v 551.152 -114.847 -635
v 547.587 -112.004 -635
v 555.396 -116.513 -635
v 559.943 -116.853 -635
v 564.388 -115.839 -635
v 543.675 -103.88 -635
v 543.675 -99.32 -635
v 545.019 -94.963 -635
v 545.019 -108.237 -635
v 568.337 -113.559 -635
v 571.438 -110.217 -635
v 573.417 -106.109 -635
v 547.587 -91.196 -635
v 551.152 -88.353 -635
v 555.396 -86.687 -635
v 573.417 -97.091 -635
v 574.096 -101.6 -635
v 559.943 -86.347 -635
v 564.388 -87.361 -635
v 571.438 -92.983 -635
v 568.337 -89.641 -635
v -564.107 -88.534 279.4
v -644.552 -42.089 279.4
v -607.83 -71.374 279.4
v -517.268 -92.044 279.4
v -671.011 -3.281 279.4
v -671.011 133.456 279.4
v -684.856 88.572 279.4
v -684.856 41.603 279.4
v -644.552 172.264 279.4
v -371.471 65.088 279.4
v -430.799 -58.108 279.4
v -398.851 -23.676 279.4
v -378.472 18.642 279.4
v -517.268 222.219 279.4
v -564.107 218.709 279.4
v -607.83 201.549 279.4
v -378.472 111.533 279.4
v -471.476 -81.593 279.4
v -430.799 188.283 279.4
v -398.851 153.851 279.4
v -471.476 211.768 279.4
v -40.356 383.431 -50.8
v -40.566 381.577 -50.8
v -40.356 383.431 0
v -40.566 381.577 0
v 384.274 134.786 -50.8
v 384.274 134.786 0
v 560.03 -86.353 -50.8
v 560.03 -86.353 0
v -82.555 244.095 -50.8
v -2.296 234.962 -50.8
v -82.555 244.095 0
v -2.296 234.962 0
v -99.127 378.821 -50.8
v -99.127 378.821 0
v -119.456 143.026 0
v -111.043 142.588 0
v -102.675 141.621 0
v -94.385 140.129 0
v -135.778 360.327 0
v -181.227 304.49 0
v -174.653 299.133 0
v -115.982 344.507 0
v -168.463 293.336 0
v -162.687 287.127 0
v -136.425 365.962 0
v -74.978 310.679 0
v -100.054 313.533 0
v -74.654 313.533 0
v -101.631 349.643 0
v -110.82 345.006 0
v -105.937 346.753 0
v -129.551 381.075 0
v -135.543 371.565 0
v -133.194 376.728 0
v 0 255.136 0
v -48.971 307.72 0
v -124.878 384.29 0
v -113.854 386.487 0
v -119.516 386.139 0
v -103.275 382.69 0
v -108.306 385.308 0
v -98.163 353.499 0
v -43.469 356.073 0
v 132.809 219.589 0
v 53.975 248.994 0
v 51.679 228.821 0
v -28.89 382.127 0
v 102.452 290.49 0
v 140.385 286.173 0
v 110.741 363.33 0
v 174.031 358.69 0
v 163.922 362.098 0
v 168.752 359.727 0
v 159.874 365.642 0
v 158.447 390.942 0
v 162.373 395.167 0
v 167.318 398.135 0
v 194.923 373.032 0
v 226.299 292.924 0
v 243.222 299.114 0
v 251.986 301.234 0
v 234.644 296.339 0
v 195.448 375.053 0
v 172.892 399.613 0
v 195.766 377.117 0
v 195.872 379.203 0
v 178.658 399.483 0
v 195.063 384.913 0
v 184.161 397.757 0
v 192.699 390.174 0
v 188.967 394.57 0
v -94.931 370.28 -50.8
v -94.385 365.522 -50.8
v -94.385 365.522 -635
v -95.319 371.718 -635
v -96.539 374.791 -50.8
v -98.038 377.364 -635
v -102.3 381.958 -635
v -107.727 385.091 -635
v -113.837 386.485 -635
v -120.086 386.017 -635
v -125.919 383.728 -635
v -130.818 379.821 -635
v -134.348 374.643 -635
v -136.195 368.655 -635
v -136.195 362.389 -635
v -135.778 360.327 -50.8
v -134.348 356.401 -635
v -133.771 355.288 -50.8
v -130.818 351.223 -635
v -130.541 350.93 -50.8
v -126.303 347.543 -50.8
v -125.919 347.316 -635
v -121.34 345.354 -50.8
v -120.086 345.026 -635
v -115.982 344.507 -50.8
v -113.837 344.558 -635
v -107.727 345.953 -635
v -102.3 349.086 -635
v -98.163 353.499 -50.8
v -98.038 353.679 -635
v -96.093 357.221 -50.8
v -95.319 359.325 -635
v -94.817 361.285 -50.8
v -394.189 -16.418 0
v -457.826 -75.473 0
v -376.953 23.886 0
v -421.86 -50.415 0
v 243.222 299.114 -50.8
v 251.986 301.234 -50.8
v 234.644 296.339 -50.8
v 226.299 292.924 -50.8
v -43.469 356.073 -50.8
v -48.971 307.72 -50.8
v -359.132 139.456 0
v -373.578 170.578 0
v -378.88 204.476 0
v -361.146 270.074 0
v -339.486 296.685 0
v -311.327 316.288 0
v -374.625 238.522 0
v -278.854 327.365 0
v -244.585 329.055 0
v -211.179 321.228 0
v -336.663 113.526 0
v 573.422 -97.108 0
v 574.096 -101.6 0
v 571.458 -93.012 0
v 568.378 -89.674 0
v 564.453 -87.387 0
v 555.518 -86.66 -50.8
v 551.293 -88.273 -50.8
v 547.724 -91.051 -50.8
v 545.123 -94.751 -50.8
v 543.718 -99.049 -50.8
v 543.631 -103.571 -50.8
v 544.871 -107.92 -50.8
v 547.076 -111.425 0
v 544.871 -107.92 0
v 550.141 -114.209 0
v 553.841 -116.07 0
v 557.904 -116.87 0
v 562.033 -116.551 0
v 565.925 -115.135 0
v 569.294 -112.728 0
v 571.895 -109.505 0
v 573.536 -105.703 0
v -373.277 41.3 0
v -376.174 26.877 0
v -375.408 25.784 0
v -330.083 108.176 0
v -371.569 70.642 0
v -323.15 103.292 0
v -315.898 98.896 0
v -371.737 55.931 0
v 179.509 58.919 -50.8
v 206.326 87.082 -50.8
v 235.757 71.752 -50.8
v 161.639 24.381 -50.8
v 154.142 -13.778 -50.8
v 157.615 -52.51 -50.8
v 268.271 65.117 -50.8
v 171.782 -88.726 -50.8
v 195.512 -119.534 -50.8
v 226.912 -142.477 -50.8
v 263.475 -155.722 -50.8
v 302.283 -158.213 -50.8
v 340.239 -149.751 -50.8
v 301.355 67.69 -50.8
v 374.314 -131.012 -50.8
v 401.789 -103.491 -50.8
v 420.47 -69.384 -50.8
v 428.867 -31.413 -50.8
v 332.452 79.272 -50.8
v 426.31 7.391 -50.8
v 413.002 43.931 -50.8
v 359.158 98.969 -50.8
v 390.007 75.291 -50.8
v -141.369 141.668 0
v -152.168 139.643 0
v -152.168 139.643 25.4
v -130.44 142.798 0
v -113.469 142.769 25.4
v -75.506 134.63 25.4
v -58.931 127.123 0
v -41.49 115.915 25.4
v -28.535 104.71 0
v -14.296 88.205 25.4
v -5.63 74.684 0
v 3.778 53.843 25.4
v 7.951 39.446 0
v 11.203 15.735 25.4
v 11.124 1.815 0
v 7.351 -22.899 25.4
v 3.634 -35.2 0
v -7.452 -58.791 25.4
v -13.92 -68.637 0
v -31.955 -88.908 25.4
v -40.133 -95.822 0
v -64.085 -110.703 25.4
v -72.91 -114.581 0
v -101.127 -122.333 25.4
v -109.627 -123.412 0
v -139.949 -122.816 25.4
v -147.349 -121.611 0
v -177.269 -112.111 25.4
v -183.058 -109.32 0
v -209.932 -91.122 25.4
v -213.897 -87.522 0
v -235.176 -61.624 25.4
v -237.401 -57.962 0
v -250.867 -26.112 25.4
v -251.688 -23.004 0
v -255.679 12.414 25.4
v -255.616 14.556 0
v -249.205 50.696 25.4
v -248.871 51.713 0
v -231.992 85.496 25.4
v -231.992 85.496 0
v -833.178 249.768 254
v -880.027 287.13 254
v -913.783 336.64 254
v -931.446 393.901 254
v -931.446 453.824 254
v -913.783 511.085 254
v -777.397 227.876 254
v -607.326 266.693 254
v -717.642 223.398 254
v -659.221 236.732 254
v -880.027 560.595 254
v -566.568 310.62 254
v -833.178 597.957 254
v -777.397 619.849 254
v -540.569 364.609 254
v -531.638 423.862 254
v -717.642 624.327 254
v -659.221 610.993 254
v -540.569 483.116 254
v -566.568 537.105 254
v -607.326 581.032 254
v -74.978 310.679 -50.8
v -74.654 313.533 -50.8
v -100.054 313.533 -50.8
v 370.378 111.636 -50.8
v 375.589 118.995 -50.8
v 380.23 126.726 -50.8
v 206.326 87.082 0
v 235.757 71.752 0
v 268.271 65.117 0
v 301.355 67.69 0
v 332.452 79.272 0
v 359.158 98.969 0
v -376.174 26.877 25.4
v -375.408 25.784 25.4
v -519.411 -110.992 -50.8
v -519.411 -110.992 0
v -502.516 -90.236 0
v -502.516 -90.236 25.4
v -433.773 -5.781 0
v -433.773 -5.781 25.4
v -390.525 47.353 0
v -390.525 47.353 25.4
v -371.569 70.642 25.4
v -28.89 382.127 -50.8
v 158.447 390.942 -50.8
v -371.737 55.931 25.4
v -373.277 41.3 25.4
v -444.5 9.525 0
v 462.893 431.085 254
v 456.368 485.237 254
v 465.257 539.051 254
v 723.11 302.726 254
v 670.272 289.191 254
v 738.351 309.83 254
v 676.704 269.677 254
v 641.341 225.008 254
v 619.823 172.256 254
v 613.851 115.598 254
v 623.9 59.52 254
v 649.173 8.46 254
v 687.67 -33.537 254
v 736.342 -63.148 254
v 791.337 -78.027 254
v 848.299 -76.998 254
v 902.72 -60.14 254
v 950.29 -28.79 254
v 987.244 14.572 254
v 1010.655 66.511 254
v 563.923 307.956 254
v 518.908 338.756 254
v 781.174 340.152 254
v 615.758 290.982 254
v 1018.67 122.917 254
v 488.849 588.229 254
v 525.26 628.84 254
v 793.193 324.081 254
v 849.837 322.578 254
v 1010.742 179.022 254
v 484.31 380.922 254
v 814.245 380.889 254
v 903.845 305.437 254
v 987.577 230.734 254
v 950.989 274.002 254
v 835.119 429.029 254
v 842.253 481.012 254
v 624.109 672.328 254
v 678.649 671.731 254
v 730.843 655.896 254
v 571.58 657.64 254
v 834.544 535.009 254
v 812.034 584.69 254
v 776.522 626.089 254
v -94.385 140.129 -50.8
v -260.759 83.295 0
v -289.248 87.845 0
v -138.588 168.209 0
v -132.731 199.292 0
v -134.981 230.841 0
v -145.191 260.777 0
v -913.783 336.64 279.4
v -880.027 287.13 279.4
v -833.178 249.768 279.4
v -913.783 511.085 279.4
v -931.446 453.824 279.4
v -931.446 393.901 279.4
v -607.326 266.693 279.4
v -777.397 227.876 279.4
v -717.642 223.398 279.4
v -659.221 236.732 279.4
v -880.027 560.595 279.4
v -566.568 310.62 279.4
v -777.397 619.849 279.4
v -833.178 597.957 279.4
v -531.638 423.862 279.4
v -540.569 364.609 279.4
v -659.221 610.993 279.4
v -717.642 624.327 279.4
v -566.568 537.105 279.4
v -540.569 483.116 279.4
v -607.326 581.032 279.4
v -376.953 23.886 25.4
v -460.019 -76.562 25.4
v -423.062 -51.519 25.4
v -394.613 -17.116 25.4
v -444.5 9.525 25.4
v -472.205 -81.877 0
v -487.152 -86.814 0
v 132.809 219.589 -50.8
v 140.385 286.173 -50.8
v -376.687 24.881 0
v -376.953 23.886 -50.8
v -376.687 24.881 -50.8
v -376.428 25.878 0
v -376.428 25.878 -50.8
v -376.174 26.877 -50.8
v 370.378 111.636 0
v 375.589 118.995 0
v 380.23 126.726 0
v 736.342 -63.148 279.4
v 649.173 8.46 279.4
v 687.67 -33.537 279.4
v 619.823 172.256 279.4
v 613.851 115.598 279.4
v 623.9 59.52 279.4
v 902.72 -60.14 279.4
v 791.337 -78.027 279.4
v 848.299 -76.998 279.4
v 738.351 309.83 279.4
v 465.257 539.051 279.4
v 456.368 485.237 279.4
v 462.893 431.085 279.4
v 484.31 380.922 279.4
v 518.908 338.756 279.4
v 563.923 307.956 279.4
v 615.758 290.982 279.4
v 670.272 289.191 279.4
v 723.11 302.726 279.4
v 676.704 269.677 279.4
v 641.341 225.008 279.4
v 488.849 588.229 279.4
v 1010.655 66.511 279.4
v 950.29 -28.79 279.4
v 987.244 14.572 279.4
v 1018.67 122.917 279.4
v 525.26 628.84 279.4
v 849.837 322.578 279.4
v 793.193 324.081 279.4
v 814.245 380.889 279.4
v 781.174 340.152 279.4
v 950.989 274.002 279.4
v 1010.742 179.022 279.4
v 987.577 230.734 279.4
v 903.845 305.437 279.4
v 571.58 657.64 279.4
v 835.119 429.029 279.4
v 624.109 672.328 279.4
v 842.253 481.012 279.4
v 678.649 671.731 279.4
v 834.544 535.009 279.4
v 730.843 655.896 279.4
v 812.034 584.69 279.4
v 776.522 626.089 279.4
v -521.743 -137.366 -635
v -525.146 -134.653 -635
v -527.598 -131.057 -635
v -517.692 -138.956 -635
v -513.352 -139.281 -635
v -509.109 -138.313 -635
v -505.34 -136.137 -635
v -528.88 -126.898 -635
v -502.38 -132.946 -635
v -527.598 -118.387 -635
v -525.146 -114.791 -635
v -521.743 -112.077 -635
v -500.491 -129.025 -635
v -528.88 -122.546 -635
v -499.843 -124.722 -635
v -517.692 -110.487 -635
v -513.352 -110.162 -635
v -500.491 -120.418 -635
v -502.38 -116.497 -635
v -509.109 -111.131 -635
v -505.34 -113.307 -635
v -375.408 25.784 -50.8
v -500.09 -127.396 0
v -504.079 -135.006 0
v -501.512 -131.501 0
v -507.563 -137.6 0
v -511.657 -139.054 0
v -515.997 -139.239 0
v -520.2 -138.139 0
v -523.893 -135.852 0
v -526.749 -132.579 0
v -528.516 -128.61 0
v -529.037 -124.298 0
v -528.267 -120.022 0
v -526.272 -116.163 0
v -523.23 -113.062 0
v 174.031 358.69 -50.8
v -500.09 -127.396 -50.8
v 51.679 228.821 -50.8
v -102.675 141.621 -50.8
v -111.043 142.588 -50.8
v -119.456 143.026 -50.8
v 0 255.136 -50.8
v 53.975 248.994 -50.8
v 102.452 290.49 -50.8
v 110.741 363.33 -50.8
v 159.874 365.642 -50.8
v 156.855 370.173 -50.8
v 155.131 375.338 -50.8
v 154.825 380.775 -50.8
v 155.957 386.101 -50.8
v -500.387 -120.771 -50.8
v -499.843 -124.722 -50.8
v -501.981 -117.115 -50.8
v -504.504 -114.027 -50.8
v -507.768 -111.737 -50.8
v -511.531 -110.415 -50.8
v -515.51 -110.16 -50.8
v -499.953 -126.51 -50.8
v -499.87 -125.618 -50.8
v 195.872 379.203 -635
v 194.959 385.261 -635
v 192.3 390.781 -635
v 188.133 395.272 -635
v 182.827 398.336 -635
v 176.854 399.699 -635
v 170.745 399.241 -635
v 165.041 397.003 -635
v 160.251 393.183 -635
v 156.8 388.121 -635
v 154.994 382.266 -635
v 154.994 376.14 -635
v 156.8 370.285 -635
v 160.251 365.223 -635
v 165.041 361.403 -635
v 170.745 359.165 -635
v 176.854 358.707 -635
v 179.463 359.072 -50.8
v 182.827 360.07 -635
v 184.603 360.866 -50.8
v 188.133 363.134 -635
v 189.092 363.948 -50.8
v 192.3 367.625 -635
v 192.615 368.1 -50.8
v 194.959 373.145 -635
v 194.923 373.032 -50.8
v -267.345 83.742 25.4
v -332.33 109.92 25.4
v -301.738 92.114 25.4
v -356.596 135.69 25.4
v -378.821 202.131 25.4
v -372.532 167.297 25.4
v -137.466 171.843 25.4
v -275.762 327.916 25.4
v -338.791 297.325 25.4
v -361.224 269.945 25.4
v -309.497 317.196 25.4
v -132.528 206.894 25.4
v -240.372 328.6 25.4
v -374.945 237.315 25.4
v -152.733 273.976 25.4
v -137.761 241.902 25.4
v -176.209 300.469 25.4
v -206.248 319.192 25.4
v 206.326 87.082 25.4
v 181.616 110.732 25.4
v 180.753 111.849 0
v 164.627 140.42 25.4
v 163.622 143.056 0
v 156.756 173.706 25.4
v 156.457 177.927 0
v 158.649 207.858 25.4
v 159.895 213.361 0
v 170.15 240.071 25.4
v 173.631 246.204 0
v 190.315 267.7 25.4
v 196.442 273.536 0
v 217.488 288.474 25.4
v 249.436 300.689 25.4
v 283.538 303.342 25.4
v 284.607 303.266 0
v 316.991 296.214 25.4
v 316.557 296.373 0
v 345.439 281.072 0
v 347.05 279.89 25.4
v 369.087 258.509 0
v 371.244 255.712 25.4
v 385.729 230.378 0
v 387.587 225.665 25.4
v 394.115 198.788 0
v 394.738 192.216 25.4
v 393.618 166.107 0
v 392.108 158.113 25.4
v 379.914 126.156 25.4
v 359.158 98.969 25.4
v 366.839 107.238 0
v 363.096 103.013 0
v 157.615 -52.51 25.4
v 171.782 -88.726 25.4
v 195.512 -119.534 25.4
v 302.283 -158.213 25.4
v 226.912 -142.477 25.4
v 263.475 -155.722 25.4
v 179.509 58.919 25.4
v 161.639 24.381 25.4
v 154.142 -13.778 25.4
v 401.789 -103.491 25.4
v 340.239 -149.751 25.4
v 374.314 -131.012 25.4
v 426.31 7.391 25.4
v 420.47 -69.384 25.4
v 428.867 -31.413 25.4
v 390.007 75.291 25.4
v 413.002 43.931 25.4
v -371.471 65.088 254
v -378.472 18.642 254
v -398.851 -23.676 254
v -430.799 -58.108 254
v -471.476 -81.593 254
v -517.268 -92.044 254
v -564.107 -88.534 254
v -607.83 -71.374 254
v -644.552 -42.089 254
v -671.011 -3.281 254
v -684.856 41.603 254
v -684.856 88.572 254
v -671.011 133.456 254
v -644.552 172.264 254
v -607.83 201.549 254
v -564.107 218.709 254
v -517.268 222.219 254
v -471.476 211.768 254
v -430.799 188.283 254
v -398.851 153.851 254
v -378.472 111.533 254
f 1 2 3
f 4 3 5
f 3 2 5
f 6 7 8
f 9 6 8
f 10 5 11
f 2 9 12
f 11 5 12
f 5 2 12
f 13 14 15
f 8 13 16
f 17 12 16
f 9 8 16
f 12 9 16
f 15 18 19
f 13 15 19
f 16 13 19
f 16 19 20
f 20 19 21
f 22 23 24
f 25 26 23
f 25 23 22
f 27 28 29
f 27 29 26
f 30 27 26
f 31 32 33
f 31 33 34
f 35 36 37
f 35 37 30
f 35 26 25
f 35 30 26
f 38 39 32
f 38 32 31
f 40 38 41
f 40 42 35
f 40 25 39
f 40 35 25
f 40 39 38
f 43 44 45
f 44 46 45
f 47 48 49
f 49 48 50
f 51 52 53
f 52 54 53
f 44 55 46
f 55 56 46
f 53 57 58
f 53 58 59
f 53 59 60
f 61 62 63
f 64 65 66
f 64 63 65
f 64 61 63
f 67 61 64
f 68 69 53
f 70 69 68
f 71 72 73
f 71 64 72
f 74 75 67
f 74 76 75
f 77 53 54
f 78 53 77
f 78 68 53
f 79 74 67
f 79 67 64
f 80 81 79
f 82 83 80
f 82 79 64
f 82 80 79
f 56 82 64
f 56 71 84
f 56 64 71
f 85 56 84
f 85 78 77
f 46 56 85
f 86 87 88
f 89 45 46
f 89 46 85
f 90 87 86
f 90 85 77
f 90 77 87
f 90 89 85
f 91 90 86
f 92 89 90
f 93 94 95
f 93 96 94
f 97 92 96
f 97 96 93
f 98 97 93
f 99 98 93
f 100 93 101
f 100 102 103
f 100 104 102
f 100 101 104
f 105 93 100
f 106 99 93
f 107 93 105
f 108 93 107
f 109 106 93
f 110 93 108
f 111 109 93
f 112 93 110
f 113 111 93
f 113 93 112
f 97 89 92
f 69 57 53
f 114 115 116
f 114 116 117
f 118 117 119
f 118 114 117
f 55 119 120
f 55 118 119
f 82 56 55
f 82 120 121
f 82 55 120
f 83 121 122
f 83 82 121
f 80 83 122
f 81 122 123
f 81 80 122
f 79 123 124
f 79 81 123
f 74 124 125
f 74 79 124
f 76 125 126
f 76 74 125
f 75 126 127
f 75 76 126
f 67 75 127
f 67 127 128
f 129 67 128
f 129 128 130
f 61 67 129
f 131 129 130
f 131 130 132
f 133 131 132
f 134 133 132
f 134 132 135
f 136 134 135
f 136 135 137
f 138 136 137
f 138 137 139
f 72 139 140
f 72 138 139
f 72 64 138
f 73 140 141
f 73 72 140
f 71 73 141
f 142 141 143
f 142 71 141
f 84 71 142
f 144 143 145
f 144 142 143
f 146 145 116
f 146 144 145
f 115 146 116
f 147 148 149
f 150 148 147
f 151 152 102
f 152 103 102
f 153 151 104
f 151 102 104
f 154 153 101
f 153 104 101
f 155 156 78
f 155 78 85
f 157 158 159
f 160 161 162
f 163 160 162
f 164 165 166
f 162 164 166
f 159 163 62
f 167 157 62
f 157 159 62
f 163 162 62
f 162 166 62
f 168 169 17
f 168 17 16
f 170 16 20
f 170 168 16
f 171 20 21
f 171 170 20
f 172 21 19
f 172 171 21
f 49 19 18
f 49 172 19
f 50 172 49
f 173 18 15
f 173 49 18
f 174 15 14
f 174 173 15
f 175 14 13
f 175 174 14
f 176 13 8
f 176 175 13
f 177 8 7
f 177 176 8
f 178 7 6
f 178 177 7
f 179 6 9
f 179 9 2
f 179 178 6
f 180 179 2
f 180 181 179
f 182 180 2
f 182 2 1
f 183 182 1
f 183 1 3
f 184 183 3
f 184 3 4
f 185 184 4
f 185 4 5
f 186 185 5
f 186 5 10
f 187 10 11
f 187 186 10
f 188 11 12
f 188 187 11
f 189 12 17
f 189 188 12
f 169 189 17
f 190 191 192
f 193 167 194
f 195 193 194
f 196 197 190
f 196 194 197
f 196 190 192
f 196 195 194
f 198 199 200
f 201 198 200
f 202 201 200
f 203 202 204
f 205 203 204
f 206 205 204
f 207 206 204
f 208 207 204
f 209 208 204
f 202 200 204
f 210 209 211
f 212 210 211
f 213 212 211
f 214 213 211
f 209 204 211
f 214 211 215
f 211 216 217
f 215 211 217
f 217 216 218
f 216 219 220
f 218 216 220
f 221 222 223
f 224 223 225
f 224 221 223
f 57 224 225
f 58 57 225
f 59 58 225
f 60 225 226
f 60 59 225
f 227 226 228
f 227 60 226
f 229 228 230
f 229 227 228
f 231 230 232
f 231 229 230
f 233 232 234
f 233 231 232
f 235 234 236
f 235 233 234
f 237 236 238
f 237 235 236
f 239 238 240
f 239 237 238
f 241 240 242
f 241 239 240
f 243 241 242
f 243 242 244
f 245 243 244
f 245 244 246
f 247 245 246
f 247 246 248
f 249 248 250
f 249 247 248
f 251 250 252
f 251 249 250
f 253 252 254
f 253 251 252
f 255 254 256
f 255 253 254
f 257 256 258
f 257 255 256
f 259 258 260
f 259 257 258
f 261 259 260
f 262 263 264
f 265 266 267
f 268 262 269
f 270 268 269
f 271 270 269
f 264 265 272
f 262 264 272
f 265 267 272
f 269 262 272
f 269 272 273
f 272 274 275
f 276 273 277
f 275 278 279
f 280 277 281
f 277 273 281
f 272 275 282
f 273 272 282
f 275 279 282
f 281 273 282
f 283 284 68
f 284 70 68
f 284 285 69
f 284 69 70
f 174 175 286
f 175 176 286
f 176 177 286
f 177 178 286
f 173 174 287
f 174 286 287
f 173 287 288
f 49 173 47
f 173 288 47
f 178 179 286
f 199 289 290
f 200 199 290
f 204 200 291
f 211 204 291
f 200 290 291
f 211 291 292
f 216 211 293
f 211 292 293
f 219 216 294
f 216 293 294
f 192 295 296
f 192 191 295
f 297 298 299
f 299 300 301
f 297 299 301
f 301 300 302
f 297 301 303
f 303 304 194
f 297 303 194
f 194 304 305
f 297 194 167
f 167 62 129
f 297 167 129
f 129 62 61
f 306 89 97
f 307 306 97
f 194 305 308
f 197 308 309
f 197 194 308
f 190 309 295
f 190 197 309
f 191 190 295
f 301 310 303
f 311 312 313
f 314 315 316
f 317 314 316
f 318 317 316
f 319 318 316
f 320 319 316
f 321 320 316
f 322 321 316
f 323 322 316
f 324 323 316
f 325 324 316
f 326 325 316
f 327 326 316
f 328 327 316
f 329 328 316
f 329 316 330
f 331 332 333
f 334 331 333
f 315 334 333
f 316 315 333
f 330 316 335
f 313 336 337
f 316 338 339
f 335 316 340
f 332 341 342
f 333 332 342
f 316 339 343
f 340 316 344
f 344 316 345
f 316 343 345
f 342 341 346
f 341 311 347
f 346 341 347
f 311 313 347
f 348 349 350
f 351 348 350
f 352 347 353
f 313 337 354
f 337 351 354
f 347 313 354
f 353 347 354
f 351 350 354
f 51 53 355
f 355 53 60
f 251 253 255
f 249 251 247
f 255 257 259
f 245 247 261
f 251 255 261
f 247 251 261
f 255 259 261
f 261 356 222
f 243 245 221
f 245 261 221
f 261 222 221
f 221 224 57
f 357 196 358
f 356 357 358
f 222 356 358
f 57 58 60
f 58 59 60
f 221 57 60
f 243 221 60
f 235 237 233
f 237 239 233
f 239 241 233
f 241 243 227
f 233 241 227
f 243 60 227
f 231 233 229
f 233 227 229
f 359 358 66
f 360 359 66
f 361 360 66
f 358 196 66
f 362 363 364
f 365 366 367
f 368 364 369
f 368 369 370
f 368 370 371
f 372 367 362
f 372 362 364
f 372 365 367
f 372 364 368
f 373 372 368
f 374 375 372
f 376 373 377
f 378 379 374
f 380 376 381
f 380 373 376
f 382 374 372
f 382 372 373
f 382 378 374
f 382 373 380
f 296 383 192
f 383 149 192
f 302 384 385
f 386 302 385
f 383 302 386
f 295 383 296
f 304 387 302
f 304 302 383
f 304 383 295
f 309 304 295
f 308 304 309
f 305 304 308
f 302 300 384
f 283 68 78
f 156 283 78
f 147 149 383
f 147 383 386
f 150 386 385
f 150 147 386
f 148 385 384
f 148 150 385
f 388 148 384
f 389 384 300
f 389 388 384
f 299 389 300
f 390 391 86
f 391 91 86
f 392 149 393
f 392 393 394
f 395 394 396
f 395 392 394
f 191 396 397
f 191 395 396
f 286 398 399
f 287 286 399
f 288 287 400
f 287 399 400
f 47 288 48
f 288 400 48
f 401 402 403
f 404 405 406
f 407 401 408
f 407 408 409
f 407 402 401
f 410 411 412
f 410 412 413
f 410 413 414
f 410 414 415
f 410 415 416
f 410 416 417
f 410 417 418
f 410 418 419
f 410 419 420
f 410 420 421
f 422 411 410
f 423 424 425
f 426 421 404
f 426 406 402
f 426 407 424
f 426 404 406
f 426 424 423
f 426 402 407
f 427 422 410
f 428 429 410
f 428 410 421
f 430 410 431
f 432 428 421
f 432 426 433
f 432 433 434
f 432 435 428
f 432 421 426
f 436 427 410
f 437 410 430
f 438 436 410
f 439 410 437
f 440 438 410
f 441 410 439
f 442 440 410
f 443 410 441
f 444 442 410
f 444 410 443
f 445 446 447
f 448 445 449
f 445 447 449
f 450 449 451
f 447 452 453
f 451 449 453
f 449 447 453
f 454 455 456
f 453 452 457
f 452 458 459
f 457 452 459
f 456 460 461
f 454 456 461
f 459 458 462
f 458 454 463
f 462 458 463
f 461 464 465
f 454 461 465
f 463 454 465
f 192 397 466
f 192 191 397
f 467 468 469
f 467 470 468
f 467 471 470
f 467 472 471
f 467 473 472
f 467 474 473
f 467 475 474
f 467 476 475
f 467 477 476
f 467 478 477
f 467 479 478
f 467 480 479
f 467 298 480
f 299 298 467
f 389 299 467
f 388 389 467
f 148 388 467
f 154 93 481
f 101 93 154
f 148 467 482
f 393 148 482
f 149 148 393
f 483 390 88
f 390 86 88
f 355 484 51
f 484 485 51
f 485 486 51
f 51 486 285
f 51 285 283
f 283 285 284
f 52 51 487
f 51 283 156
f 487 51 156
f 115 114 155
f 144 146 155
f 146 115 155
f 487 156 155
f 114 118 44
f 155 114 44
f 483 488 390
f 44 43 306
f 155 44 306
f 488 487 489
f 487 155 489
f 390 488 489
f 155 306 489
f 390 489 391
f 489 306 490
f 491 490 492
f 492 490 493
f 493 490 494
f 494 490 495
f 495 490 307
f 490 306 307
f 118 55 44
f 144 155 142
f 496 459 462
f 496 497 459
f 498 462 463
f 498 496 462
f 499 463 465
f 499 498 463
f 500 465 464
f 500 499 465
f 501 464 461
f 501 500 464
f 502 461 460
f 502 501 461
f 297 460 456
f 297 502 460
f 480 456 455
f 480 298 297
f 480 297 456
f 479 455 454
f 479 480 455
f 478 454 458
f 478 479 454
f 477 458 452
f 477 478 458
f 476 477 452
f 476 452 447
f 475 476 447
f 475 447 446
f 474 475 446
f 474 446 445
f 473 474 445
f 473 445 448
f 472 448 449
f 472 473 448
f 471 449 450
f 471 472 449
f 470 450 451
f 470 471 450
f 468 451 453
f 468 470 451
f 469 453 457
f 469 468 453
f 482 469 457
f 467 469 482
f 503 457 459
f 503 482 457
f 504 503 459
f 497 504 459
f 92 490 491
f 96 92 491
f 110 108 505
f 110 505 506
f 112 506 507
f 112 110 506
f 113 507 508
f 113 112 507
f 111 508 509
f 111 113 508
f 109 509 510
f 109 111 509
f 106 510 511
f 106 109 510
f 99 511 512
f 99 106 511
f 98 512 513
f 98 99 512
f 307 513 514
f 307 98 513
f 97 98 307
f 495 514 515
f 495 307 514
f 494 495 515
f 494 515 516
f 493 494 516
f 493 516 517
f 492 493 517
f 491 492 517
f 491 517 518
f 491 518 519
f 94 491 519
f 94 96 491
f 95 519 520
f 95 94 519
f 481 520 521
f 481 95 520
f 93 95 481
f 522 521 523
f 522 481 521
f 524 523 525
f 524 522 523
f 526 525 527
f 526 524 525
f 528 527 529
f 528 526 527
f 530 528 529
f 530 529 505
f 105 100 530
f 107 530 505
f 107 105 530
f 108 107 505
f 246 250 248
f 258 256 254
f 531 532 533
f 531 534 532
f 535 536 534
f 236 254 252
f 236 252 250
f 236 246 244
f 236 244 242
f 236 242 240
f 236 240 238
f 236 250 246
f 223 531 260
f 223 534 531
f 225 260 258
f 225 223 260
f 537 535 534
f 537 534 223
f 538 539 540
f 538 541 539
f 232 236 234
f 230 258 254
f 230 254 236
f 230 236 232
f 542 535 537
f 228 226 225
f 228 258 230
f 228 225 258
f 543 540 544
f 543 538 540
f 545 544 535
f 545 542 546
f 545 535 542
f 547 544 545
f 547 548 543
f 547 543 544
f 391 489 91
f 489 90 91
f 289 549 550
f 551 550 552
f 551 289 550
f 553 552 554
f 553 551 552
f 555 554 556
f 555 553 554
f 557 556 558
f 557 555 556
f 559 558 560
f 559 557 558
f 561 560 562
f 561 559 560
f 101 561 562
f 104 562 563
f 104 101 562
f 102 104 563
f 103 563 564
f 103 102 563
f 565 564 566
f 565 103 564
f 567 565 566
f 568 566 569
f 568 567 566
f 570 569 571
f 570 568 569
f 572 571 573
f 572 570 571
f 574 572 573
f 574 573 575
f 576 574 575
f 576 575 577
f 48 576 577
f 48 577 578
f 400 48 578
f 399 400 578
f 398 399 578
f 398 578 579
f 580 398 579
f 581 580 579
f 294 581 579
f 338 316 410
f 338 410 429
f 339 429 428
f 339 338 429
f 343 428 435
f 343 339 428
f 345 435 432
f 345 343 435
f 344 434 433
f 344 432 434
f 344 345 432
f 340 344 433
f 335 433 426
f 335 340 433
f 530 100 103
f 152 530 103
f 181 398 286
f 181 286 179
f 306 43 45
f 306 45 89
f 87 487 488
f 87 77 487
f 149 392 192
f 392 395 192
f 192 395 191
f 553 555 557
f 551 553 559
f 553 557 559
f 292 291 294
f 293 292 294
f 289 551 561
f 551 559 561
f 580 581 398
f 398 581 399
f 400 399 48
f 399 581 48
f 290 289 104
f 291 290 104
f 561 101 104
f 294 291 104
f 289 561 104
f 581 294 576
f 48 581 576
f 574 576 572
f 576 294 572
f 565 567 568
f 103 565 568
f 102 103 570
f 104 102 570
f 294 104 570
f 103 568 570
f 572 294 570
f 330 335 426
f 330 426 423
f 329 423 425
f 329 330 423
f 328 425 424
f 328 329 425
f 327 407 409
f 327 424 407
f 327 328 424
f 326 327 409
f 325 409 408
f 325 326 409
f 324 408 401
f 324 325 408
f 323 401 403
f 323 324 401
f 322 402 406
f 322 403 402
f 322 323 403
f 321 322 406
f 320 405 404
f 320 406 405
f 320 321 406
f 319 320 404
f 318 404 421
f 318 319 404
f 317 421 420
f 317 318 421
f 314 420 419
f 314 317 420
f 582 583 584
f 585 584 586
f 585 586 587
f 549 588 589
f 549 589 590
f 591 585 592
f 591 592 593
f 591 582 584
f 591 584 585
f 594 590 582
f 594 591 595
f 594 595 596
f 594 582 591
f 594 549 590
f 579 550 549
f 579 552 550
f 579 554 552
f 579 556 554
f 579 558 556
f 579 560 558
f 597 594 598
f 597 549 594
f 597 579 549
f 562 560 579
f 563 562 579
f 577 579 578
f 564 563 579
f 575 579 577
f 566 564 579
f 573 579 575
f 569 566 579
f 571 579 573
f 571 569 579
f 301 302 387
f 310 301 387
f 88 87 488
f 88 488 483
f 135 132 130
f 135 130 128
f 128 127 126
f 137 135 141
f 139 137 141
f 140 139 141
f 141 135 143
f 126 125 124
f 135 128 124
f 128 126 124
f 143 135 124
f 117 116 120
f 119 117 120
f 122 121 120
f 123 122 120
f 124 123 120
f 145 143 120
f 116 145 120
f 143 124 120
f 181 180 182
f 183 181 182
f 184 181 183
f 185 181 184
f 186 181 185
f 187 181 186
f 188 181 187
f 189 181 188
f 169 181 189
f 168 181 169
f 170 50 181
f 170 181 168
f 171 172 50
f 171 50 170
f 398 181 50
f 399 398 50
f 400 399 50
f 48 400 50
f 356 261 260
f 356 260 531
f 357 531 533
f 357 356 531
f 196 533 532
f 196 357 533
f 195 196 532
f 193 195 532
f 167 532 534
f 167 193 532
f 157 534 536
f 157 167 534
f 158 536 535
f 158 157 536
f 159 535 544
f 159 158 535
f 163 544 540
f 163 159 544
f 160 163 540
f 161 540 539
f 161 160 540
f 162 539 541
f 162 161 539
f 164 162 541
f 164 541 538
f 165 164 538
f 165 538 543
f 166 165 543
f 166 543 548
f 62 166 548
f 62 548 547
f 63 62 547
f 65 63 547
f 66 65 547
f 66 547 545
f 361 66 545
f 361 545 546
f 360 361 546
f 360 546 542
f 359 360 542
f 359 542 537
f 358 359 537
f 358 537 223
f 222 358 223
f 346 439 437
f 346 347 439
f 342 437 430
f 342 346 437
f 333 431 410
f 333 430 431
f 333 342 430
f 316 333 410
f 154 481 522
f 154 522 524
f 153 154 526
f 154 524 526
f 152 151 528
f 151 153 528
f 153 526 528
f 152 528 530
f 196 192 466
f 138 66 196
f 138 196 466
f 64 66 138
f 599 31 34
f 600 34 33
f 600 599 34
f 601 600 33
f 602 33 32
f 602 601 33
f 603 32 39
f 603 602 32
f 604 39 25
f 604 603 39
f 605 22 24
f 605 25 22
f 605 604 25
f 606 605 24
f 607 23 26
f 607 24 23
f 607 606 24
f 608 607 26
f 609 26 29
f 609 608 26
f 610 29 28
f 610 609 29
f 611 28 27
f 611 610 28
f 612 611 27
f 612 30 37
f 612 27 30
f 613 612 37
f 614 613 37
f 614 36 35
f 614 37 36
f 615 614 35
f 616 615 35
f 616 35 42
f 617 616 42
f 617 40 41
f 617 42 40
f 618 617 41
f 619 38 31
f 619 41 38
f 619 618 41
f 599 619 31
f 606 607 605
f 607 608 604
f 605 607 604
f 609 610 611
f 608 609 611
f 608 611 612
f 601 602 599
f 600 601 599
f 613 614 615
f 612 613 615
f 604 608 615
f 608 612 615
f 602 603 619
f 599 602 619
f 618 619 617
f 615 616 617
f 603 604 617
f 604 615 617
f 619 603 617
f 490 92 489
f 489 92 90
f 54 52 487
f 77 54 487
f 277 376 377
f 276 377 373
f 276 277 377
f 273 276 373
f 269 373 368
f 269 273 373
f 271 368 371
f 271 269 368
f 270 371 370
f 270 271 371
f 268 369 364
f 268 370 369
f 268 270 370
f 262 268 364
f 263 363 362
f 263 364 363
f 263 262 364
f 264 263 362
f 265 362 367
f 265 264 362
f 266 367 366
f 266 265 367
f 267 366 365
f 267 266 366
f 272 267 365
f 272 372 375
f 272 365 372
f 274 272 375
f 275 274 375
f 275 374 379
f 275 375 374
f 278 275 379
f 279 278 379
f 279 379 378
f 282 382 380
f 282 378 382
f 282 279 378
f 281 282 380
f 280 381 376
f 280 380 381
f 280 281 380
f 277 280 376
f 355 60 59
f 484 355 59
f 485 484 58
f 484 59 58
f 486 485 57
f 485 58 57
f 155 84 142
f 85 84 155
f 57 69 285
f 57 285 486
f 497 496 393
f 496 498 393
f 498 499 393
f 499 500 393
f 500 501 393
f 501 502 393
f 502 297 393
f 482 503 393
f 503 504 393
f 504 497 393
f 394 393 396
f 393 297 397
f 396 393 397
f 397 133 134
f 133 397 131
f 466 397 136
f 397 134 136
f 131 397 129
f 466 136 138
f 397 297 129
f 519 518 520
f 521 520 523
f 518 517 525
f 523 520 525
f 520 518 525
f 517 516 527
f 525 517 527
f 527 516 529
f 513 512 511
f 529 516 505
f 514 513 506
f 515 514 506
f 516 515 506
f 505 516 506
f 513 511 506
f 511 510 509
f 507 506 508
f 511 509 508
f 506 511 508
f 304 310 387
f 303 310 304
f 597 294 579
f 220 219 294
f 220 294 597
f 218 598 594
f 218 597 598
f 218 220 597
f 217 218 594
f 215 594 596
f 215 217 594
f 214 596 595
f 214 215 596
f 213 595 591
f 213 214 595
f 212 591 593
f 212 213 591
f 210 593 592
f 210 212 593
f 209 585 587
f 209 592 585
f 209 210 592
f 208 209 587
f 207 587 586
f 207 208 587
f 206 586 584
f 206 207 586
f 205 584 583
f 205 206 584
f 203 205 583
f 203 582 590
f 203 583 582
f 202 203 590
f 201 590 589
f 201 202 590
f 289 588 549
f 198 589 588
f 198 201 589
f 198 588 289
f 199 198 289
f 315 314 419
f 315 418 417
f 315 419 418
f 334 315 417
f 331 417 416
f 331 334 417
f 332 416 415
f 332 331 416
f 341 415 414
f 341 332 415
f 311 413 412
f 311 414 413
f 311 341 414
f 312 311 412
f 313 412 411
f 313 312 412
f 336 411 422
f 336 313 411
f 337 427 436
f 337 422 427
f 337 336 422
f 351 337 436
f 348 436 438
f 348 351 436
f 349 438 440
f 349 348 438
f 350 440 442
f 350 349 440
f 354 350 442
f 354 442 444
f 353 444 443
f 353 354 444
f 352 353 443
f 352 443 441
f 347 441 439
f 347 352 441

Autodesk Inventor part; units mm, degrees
ref_plane "YZ Plane" through (0, 0, 0) normal (1, 0, 0) x (0, 1, 0)
ref_plane "XZ Plane" through (0, 0, 0) normal (0, 1, 0) x (-1, 0, 0)
sketch "Sketch1" plane through (0, 0, 0) normal (0, 0, 1) x (1, 0, 0)
  line L0 (-40.3555, 383.4313) -> (111.0673, 366.2011)
  line L1 (111.0673, 366.2011) -> (102.4522, 290.4897)
  line L2 (102.4522, 290.4897) -> (-48.9706, 307.7199)
  line L3 (-48.9706, 307.7199) -> (-40.3555, 383.4313)
  line L4 (-87.7484, 312.1324) -> (140.3854, 286.1733)
  line L5 (140.3854, 286.1733) -> (132.8088, 219.5891)
  line L6 (132.8088, 219.5891) -> (-95.3249, 245.5482)
  line L7 (-95.3249, 245.5482) -> (-87.7484, 312.1324)
  circle A0 centre (175.3182, 379.203) radius 20.5535
  circle A1 centre (-115.4076, 365.5218) radius 21.0224
  circle A2 centre (558.8, -101.6) radius 15.2961
  circle A3 centre (-514.4431, -124.7218) radius 14.6004
  line L8 (-128.6785, 349.2176) -> (-505.2263, -113.3983) construction
  line L9 (-94.4085, 366.51) -> (154.7875, 378.2368) construction
  line L10 (187.1074, 362.3667) -> (548.0677, -90.701) construction
  line L11 (-87.7484, 312.1324) -> (-107.085, 142.1977)
  circle A4 centre (-732.6645, 423.8625) radius 24.2389
  circle A5 centre (-732.6645, 423.8625) radius 201.0267
  circle A6 centre (649.2875, 481.0125) radius 192.9655
  circle A7 centre (816.1948, 122.9166) radius 202.4756
  circle A8 centre (-122.1817, 9.525) radius 133.5288
  circle A9 centre (-529.0436, 65.0875) radius 157.5724
  circle A10 centre (-255.7105, 206.375) radius 123.1837
  circle A11 centre (275.6471, 184.2457) radius 119.3572
  circle A12 centre (291.6085, -20.9726) radius 137.6551
  line L12 (-519.4107, -110.9924) -> (-135.7782, 360.3274)
  line L13 (-99.1269, 378.8214) -> (158.4473, 390.9425)
  line L14 (194.9233, 373.0316) -> (560.0295, -86.3534)
  line L15 (-500.0898, -127.3963) -> (-115.9822, 344.5072)
  line L16 (-98.1626, 353.4988) -> (159.8736, 365.6417)
  line L17 (174.0312, 358.6899) -> (544.8706, -107.9199)
  line L18 (-74.6538, 313.5326) -> (-94.3852, 140.1286)
  line L19 (-100.0538, 313.5326) -> (-119.4555, 143.026)
  line L20 (-100.0538, 313.5326) -> (-74.6538, 313.5326)
  line L21 (0, 255.1359) -> (53.975, 248.9942)
  line L22 (53.975, 248.9942) -> (36.2304, 93.0509)
  line L23 (36.2304, 93.0509) -> (-17.7446, 99.1926)
  line L24 (-17.7446, 99.1926) -> (0, 255.1359)
  line L25 (-444.5, 9.525) -> (-390.525, 47.3529)
  line L26 (-390.525, 47.3529) -> (-276.9226, -114.7417)
  line L27 (-276.9226, -114.7417) -> (-330.8976, -152.5695)
  line L28 (-330.8976, -152.5695) -> (-444.5, 9.525)
  point P0 (0, 0)
  point P1 (353.9374, 101.7631)
  point P2 (359.158, 98.9691)
  point P3 (370.3781, 111.6358)
  point P4 (-43.4686, 356.0727)
  point P5 (-74.9784, 310.6793)
  point P6 (-82.555, 244.0951)
  point P7 (-2.2955, 234.9625)
  point P8 (51.6795, 228.8208)
  point P9 (110.7406, 363.3296)
  point P10 (-28.89, 382.1267)
  point P11 (-40.5665, 381.5772)
  point P12 (-376.9531, 23.8858)
  point P13 (-376.1743, 26.8765)
  point P14 (-375.4084, 25.7836)
  point P15 (206.3261, 87.0822)
  point P16 (-231.992, 85.4963)
  point P17 (-152.1677, 139.6434)
  point P18 (-433.7732, -5.7806)
  point P19 (-502.5158, -90.2359)
  point P20 (-371.569, 70.6416)
  point P21 (384.2743, 134.7858)
  point P22 (226.299, 292.9237)
  point P23 (251.9859, 301.2341)
  dimension "d0" = 152.4
  dimension "d1" = 76.2
  dimension "d2" = 12.5196
  dimension "d3" = 12.8203
  dimension "d4" = 12.8523
  dimension "d5" = 12.3848
  dimension "d15" = 30.5921
extrude "Extrusion1" add sketch "Sketch1" against normal blind 635 contours A0 | A1 | A2 | A3
extrude "Extrusion2" add sketch "Sketch1" against normal blind 50.8 contours L0 L13 L3 | L13 A0 L16 L1 L0 | L0 L1 L16 L3 L13 | L3 L16 A1 L13 | L16 L1 L2 L3 | L2 L4 L5 L6 L22 L21 L24 L18 | A1 L15 A10 L12 | L14 A11 L17 A0 | L18 L6 L7 L4 | L4 L7 L11 A8 L19 L20 L18 | A10 L15 L12 | L18 A8 L11 L6 | A10 L15 L26 A9 L12 | L14 A2 L17 A11 | A11 A12 | A9 L26 L12 | L12 L28 L15 A9 | A9 L15 A3 L12 | L26 A9 L15 L28 L12 picked at (299.5607, -83.2426)
extrude "Extrusion3" add sketch "Sketch1" along normal blind 25.4 contours L12 A10 | A10 L15 L12 | L14 A11 L17 | A11 L14 | L17 A11 A12 | A10 A8 L15 | A12 A11 | A11 A12 | A8 A10 | A9 L26 L12 | A10 A8 | L15 A9 L26 | L12 L28 L15 A9 | L26 A9 L15 L28 L12 | L12 L28 L25 | A9 L28 L15 | L15 L28 A9
ref_plane "Work Plane1" through (0, 0, 254) normal (0, 0, 1) x (1, 0, 0)
sketch "Sketch2" plane through (0, 0, 254) normal (0, 0, 1) x (1, 0, 0)
  circle A0 centre (-732.6645, 423.8625) radius 201.0267 projected
  circle A1 centre (649.2875, 481.0125) radius 192.9655 projected
  circle A2 centre (816.1948, 122.9166) radius 202.4756 projected
  circle A3 centre (-529.0436, 65.0875) radius 157.5724 projected
  point P0 (0, 0)
extrude "Extrusion4" add sketch "Sketch2" along normal blind 25.4
properties part number "Drums"
